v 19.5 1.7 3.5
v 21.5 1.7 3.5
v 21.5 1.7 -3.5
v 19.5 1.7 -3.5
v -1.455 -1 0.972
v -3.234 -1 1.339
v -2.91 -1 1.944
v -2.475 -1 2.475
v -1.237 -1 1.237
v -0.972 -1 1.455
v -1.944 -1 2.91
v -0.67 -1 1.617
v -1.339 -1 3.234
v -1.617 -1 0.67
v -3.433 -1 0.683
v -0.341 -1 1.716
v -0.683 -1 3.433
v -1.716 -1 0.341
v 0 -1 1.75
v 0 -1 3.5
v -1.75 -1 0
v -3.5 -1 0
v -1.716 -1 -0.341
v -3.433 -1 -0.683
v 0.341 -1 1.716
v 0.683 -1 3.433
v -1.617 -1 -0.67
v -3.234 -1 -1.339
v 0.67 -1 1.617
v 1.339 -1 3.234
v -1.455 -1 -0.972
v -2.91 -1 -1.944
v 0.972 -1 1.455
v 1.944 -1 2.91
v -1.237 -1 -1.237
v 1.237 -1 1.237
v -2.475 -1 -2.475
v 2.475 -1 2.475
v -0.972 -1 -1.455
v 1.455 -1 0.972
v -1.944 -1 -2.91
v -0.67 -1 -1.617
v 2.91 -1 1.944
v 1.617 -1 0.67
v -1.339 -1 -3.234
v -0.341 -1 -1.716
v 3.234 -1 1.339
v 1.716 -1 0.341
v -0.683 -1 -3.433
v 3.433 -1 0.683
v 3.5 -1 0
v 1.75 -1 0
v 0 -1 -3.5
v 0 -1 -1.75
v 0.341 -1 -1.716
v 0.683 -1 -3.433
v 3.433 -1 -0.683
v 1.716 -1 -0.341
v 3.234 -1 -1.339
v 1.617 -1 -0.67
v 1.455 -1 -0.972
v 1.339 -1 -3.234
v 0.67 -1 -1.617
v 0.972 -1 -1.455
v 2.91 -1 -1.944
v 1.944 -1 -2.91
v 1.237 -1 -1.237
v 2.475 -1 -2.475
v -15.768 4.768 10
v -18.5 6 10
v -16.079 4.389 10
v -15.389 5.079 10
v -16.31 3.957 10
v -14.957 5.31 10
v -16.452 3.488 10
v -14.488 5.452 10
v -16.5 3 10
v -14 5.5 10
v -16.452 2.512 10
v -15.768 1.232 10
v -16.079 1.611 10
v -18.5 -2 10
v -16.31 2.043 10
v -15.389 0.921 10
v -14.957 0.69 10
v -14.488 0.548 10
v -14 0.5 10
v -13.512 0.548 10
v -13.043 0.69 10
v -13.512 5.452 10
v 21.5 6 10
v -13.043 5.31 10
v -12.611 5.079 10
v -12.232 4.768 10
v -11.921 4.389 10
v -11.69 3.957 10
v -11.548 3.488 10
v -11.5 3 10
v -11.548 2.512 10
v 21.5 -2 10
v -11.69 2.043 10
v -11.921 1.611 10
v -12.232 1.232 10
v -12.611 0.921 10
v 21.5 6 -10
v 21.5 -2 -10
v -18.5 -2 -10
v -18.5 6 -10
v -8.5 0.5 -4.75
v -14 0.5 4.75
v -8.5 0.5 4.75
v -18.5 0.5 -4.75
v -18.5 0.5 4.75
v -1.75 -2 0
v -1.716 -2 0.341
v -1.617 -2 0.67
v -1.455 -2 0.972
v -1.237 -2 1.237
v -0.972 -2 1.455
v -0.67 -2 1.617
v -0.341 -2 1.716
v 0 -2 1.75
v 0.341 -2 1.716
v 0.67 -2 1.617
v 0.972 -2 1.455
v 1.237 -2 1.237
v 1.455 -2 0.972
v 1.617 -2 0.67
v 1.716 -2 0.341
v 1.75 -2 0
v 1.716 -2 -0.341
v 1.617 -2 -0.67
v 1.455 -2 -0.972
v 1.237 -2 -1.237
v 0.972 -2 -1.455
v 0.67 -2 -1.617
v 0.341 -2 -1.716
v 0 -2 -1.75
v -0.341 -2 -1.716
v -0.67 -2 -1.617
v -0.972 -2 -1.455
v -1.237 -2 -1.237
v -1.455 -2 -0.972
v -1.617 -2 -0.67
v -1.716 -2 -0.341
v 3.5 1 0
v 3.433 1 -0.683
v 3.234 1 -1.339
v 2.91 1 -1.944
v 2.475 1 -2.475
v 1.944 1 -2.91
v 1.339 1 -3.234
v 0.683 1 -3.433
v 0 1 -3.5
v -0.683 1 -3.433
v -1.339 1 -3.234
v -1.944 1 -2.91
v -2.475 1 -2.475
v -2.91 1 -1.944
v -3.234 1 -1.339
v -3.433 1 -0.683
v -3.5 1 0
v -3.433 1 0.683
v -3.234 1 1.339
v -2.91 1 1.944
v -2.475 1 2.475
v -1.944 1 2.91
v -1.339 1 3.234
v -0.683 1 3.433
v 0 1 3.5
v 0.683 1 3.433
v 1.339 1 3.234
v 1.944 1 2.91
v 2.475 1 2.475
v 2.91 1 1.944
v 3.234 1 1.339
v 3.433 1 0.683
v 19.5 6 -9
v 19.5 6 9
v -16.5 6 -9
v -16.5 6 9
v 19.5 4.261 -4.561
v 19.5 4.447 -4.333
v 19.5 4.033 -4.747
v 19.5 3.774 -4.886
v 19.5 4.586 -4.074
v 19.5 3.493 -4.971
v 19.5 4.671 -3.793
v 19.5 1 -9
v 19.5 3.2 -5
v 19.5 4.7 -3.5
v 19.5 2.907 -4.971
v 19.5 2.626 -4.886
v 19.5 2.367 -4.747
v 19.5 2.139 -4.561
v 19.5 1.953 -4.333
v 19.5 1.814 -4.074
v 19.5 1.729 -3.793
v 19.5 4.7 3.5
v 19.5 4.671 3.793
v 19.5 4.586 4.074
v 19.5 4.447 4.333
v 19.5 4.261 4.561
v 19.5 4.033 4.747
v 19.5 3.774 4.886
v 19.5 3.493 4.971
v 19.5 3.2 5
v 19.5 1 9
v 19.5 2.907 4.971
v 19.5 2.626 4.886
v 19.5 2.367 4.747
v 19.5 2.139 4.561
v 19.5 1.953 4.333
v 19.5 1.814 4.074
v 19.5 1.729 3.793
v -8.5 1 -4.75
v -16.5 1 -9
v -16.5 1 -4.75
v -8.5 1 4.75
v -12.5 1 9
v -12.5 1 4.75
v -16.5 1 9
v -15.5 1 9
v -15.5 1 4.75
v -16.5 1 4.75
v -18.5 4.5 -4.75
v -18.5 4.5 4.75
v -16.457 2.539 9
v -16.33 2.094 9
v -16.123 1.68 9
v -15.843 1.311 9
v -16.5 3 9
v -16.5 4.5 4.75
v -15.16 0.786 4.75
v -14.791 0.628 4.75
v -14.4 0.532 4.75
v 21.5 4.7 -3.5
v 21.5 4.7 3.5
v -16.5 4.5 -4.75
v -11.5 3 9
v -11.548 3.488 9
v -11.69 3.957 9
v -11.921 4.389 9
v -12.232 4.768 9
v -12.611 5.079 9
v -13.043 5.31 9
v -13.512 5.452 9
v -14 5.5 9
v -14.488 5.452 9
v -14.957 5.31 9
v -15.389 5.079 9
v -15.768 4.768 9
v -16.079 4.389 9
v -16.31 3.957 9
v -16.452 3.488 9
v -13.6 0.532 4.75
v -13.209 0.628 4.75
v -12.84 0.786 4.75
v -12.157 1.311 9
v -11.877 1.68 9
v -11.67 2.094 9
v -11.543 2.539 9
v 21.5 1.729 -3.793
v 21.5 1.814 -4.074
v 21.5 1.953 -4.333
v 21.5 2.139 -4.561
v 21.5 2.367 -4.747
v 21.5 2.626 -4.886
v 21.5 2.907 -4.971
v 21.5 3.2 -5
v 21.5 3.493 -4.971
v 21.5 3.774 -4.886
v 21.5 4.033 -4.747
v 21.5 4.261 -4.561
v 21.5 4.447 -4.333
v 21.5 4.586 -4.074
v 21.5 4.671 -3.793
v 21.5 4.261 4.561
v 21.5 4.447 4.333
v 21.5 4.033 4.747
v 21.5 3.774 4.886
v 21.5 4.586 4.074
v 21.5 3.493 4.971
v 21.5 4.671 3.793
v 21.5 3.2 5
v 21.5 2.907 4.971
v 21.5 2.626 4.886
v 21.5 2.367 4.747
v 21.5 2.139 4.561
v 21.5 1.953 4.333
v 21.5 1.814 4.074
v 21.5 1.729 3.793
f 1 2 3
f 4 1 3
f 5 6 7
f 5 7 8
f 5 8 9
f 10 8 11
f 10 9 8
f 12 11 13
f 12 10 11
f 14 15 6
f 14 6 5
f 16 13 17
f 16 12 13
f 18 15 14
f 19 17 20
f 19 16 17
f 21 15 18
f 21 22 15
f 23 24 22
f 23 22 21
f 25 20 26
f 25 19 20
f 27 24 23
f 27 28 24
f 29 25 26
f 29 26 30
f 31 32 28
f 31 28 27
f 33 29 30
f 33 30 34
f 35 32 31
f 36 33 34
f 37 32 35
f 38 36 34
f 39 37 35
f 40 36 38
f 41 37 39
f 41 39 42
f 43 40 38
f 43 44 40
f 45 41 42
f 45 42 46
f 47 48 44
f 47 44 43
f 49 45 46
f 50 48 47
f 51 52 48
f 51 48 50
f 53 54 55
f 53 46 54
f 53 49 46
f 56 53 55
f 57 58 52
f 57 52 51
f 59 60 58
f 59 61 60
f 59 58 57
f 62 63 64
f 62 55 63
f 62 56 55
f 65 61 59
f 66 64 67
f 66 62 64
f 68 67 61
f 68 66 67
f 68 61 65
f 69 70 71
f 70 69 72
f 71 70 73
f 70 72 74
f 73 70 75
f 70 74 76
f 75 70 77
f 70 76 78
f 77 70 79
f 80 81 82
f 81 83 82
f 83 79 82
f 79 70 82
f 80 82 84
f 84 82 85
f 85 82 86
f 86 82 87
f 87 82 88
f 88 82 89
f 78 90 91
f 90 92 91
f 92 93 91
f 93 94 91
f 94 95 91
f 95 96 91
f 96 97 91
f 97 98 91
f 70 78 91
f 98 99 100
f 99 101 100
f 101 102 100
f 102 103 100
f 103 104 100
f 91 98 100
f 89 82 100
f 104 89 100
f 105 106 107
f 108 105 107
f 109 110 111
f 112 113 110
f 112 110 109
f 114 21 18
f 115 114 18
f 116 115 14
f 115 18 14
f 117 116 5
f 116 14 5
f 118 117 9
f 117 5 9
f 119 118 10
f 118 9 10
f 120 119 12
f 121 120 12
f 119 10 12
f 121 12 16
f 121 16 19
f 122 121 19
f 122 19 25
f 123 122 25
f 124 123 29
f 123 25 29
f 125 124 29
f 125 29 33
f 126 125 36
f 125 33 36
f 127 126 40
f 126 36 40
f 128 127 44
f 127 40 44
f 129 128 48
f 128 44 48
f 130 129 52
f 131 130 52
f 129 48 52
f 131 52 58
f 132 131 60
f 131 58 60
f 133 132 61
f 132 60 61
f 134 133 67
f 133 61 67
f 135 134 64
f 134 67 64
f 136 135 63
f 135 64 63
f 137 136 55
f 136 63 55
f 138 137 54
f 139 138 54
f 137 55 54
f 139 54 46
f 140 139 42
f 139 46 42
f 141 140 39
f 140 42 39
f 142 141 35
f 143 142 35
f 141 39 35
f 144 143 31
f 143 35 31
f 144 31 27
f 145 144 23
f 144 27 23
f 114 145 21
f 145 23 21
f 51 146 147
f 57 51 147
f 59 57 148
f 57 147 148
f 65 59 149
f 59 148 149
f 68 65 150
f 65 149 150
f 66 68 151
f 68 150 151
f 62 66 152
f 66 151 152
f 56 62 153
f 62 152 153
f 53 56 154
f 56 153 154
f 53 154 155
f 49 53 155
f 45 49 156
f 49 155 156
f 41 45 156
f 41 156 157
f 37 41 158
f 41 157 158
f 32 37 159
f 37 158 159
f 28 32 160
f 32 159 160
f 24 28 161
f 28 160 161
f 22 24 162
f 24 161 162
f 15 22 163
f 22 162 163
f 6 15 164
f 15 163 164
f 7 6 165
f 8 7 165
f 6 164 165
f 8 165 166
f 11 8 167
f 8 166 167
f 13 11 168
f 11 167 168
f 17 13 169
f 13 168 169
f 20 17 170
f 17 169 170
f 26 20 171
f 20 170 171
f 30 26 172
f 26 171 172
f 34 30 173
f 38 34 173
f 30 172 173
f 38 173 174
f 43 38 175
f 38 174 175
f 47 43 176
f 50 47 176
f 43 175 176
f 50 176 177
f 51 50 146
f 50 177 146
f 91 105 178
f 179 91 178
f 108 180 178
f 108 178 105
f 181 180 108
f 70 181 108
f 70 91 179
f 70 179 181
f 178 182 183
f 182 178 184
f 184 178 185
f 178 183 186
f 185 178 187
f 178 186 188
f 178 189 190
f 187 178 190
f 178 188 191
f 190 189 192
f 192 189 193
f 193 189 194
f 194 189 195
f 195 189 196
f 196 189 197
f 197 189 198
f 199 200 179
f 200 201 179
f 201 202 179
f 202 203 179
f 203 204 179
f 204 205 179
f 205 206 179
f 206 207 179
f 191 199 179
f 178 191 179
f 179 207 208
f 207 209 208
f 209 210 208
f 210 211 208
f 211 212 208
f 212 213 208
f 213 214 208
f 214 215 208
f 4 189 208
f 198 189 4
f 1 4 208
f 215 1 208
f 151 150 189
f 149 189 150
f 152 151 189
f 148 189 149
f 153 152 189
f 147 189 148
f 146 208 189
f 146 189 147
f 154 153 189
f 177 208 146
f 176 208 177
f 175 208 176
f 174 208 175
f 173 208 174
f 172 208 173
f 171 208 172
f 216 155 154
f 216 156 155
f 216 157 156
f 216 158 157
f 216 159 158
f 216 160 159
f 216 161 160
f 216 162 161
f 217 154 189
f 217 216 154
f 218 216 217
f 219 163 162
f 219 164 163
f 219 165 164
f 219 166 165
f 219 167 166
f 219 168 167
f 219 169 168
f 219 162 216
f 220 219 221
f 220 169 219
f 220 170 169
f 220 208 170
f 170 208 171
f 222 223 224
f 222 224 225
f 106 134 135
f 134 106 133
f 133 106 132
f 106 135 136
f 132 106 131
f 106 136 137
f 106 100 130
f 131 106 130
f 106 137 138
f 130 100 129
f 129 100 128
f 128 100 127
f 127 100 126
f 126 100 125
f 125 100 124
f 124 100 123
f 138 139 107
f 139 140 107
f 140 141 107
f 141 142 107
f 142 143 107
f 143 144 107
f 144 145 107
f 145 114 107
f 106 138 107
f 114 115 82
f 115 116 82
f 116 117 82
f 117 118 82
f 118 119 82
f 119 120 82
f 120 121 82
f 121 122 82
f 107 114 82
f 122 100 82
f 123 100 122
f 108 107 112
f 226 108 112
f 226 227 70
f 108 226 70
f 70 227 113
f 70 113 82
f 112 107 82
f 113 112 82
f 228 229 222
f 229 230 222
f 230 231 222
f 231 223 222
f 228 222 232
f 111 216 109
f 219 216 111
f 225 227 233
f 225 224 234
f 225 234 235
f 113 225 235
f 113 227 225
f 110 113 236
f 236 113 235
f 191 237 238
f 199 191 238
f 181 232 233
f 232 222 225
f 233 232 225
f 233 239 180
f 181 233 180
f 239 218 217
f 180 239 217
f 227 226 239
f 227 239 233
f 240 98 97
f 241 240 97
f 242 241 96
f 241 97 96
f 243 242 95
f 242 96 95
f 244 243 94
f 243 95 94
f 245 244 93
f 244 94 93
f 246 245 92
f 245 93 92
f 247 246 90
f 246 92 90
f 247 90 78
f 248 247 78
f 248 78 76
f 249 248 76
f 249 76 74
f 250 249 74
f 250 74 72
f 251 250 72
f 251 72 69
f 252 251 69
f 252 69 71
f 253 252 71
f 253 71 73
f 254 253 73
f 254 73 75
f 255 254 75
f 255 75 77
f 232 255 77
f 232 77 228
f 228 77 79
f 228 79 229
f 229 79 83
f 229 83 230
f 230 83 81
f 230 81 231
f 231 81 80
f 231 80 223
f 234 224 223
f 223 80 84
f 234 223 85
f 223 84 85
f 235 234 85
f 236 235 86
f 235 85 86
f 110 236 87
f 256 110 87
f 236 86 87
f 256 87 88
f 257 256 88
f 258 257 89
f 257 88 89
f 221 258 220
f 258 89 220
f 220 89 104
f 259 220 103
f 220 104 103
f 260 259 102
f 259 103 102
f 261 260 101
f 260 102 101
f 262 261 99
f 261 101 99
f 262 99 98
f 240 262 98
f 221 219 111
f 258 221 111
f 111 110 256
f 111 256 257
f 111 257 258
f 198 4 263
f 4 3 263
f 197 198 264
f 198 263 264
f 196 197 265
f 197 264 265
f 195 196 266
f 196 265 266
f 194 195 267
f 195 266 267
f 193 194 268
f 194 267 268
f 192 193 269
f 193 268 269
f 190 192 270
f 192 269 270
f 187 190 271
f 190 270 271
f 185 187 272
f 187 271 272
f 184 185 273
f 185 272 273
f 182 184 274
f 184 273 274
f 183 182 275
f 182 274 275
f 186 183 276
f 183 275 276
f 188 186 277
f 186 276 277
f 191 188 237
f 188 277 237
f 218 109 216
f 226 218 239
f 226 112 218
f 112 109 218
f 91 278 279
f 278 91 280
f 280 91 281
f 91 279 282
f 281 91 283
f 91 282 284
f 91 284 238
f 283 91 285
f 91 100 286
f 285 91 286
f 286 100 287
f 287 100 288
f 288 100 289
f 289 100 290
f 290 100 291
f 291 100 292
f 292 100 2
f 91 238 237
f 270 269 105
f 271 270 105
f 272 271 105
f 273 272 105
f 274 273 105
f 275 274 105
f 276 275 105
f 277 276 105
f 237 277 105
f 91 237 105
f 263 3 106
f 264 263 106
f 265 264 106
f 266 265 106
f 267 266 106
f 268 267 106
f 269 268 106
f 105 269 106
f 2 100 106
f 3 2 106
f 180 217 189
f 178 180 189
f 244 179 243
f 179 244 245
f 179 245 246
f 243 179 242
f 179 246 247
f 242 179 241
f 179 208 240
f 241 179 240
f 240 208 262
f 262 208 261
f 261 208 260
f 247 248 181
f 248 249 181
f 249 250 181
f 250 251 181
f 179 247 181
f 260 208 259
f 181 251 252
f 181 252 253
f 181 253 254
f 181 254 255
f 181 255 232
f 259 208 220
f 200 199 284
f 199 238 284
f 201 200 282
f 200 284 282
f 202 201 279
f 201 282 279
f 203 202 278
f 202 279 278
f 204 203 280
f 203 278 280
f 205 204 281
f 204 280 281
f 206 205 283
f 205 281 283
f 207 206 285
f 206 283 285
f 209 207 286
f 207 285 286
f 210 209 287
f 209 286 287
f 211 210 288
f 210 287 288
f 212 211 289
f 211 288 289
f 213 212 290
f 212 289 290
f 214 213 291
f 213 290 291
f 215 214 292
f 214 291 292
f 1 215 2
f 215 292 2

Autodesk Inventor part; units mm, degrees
ref_plane "YZ Plane" through (0, 0, 0) normal (1, 0, 0) x (0, 1, 0)
ref_plane "XZ Plane" through (0, 0, 0) normal (0, 1, 0) x (-1, 0, 0)
ref_plane "XY Plane" through (0, 0, 0) normal (0, 0, 1) x (1, 0, 0)
sketch "Szkic1" plane through (0, 0, 0) normal (0, 1, 0) x (-1, 0, 0)
  circle A0 centre (0, 0) radius 1.75
  line L0 (18.5, 10) -> (-21.5, 10)
  line L1 (-21.5, 10) -> (-21.5, -10)
  line L2 (-21.5, -10) -> (18.5, -10)
  line L3 (18.5, -10) -> (18.5, 10)
  line L4 (-19.5, 9) -> (16.5, 9)
  line L5 (16.5, 9) -> (16.5, -9)
  line L6 (16.5, -9) -> (-19.5, -9)
  line L7 (-19.5, -9) -> (-19.5, 9)
  dimension "d0" = 3.5
  dimension "d1" = 20
  dimension "d2" = 40
  dimension "d3" = 36
  dimension "d4" = 18
  dimension "d9" = 16.5
  dimension "d10" = 2
extrude "Wyciągnięcie proste1" add sketch "Szkic1" along normal blind 6 contours L3 L2 L1 L0
extrude "Wyciągnięcie proste2" add sketch "Szkic1" along normal blind 1 and the other way blind 2 contours L3 L2 L1 L0 | L4 L5 L6 L7
sketch "Szkic2" plane through (21.5, 0, 10) normal (1, 0, 0) x (0, 0, -1)
  line L0 (10, 0) -> (10, 3.2)
  line L1 (10, 0) -> (13.2, 0) construction
  line L2 (6.5, 3.2) -> (13.5, 3.2) construction
  line L3 (6.5, 1.7) -> (13.5, 1.7)
  line L4 (13.5, 4.7) -> (6.5, 4.7)
  arc A0 (6.5, 4.7) -> (6.5, 1.7) centre (6.5, 3.2) ccw
  arc A1 (13.5, 1.7) -> (13.5, 4.7) centre (13.5, 3.2) ccw
  dimension "d11" = 3.2
  dimension "d12" = 90
  dimension "d13" = 3.5
  dimension "d14" = 3
extrude "Wyciągnięcie proste3" cut sketch "Szkic2" against normal blind 10
sketch "Szkic3" plane through (-18.5, 0, -10) normal (-1, 0, 0) x (0, 0, 1)
  line L0 (10, 0) -> (10, 2.5)
  line L1 (10, 0) -> (12.5, 0) construction
  line L2 (5.25, 4.5) -> (14.75, 4.5)
  line L3 (14.75, 4.5) -> (14.75, 0.5)
  line L4 (14.75, 0.5) -> (5.25, 0.5)
  line L5 (5.25, 0.5) -> (5.25, 4.5)
  line L6 (5.25, 4.5) -> (14.75, 0.5) construction
  line L7 (14.75, 4.5) -> (5.25, 0.5) construction
  dimension "d17" = 2.5
  dimension "d18" = 90
  dimension "d19" = 9.5
  dimension "d20" = 4
extrude "Wyciągnięcie proste4" cut sketch "Szkic3" against normal blind 10
sketch "Szkic4" plane through (0, 1, 0) normal (0, 1, 0) x (1, 0, 0)
  circle A0 centre (0, 0) radius 1.75 projected
  circle A1 centre (0, 0) radius 3.5
  dimension "d23" = 7
extrude "Wyciągnięcie proste5" cut sketch "Szkic4" against normal blind 2
sketch "Szkic5" plane through (-18.5, 6, 10) normal (0, 0, 1) x (1, 0, 0)
  line L0 (2, -5) -> (2, 0) projected
  line L1 (2, -5) -> (2, 0)
  line L2 (2, 0) -> (2, -5)
  line L3 (2, -5) -> (2, -5.5)
  line L4 (0, -5.5) -> (10, -5.5) projected
  line L5 (2, -5.5) -> (7, -5.5)
  circle A0 centre (4.5, -3) radius 2.5
  point P0 (18.5, -6)
  dimension "d28" = 5
  dimension "d29" = 5
  dimension "d32" = 2.5
  dimension "d33" = 2.5
extrude "Wyciągnięcie proste6" cut sketch "Szkic5" against normal blind 10 contours A0
properties part number "elektronika"
